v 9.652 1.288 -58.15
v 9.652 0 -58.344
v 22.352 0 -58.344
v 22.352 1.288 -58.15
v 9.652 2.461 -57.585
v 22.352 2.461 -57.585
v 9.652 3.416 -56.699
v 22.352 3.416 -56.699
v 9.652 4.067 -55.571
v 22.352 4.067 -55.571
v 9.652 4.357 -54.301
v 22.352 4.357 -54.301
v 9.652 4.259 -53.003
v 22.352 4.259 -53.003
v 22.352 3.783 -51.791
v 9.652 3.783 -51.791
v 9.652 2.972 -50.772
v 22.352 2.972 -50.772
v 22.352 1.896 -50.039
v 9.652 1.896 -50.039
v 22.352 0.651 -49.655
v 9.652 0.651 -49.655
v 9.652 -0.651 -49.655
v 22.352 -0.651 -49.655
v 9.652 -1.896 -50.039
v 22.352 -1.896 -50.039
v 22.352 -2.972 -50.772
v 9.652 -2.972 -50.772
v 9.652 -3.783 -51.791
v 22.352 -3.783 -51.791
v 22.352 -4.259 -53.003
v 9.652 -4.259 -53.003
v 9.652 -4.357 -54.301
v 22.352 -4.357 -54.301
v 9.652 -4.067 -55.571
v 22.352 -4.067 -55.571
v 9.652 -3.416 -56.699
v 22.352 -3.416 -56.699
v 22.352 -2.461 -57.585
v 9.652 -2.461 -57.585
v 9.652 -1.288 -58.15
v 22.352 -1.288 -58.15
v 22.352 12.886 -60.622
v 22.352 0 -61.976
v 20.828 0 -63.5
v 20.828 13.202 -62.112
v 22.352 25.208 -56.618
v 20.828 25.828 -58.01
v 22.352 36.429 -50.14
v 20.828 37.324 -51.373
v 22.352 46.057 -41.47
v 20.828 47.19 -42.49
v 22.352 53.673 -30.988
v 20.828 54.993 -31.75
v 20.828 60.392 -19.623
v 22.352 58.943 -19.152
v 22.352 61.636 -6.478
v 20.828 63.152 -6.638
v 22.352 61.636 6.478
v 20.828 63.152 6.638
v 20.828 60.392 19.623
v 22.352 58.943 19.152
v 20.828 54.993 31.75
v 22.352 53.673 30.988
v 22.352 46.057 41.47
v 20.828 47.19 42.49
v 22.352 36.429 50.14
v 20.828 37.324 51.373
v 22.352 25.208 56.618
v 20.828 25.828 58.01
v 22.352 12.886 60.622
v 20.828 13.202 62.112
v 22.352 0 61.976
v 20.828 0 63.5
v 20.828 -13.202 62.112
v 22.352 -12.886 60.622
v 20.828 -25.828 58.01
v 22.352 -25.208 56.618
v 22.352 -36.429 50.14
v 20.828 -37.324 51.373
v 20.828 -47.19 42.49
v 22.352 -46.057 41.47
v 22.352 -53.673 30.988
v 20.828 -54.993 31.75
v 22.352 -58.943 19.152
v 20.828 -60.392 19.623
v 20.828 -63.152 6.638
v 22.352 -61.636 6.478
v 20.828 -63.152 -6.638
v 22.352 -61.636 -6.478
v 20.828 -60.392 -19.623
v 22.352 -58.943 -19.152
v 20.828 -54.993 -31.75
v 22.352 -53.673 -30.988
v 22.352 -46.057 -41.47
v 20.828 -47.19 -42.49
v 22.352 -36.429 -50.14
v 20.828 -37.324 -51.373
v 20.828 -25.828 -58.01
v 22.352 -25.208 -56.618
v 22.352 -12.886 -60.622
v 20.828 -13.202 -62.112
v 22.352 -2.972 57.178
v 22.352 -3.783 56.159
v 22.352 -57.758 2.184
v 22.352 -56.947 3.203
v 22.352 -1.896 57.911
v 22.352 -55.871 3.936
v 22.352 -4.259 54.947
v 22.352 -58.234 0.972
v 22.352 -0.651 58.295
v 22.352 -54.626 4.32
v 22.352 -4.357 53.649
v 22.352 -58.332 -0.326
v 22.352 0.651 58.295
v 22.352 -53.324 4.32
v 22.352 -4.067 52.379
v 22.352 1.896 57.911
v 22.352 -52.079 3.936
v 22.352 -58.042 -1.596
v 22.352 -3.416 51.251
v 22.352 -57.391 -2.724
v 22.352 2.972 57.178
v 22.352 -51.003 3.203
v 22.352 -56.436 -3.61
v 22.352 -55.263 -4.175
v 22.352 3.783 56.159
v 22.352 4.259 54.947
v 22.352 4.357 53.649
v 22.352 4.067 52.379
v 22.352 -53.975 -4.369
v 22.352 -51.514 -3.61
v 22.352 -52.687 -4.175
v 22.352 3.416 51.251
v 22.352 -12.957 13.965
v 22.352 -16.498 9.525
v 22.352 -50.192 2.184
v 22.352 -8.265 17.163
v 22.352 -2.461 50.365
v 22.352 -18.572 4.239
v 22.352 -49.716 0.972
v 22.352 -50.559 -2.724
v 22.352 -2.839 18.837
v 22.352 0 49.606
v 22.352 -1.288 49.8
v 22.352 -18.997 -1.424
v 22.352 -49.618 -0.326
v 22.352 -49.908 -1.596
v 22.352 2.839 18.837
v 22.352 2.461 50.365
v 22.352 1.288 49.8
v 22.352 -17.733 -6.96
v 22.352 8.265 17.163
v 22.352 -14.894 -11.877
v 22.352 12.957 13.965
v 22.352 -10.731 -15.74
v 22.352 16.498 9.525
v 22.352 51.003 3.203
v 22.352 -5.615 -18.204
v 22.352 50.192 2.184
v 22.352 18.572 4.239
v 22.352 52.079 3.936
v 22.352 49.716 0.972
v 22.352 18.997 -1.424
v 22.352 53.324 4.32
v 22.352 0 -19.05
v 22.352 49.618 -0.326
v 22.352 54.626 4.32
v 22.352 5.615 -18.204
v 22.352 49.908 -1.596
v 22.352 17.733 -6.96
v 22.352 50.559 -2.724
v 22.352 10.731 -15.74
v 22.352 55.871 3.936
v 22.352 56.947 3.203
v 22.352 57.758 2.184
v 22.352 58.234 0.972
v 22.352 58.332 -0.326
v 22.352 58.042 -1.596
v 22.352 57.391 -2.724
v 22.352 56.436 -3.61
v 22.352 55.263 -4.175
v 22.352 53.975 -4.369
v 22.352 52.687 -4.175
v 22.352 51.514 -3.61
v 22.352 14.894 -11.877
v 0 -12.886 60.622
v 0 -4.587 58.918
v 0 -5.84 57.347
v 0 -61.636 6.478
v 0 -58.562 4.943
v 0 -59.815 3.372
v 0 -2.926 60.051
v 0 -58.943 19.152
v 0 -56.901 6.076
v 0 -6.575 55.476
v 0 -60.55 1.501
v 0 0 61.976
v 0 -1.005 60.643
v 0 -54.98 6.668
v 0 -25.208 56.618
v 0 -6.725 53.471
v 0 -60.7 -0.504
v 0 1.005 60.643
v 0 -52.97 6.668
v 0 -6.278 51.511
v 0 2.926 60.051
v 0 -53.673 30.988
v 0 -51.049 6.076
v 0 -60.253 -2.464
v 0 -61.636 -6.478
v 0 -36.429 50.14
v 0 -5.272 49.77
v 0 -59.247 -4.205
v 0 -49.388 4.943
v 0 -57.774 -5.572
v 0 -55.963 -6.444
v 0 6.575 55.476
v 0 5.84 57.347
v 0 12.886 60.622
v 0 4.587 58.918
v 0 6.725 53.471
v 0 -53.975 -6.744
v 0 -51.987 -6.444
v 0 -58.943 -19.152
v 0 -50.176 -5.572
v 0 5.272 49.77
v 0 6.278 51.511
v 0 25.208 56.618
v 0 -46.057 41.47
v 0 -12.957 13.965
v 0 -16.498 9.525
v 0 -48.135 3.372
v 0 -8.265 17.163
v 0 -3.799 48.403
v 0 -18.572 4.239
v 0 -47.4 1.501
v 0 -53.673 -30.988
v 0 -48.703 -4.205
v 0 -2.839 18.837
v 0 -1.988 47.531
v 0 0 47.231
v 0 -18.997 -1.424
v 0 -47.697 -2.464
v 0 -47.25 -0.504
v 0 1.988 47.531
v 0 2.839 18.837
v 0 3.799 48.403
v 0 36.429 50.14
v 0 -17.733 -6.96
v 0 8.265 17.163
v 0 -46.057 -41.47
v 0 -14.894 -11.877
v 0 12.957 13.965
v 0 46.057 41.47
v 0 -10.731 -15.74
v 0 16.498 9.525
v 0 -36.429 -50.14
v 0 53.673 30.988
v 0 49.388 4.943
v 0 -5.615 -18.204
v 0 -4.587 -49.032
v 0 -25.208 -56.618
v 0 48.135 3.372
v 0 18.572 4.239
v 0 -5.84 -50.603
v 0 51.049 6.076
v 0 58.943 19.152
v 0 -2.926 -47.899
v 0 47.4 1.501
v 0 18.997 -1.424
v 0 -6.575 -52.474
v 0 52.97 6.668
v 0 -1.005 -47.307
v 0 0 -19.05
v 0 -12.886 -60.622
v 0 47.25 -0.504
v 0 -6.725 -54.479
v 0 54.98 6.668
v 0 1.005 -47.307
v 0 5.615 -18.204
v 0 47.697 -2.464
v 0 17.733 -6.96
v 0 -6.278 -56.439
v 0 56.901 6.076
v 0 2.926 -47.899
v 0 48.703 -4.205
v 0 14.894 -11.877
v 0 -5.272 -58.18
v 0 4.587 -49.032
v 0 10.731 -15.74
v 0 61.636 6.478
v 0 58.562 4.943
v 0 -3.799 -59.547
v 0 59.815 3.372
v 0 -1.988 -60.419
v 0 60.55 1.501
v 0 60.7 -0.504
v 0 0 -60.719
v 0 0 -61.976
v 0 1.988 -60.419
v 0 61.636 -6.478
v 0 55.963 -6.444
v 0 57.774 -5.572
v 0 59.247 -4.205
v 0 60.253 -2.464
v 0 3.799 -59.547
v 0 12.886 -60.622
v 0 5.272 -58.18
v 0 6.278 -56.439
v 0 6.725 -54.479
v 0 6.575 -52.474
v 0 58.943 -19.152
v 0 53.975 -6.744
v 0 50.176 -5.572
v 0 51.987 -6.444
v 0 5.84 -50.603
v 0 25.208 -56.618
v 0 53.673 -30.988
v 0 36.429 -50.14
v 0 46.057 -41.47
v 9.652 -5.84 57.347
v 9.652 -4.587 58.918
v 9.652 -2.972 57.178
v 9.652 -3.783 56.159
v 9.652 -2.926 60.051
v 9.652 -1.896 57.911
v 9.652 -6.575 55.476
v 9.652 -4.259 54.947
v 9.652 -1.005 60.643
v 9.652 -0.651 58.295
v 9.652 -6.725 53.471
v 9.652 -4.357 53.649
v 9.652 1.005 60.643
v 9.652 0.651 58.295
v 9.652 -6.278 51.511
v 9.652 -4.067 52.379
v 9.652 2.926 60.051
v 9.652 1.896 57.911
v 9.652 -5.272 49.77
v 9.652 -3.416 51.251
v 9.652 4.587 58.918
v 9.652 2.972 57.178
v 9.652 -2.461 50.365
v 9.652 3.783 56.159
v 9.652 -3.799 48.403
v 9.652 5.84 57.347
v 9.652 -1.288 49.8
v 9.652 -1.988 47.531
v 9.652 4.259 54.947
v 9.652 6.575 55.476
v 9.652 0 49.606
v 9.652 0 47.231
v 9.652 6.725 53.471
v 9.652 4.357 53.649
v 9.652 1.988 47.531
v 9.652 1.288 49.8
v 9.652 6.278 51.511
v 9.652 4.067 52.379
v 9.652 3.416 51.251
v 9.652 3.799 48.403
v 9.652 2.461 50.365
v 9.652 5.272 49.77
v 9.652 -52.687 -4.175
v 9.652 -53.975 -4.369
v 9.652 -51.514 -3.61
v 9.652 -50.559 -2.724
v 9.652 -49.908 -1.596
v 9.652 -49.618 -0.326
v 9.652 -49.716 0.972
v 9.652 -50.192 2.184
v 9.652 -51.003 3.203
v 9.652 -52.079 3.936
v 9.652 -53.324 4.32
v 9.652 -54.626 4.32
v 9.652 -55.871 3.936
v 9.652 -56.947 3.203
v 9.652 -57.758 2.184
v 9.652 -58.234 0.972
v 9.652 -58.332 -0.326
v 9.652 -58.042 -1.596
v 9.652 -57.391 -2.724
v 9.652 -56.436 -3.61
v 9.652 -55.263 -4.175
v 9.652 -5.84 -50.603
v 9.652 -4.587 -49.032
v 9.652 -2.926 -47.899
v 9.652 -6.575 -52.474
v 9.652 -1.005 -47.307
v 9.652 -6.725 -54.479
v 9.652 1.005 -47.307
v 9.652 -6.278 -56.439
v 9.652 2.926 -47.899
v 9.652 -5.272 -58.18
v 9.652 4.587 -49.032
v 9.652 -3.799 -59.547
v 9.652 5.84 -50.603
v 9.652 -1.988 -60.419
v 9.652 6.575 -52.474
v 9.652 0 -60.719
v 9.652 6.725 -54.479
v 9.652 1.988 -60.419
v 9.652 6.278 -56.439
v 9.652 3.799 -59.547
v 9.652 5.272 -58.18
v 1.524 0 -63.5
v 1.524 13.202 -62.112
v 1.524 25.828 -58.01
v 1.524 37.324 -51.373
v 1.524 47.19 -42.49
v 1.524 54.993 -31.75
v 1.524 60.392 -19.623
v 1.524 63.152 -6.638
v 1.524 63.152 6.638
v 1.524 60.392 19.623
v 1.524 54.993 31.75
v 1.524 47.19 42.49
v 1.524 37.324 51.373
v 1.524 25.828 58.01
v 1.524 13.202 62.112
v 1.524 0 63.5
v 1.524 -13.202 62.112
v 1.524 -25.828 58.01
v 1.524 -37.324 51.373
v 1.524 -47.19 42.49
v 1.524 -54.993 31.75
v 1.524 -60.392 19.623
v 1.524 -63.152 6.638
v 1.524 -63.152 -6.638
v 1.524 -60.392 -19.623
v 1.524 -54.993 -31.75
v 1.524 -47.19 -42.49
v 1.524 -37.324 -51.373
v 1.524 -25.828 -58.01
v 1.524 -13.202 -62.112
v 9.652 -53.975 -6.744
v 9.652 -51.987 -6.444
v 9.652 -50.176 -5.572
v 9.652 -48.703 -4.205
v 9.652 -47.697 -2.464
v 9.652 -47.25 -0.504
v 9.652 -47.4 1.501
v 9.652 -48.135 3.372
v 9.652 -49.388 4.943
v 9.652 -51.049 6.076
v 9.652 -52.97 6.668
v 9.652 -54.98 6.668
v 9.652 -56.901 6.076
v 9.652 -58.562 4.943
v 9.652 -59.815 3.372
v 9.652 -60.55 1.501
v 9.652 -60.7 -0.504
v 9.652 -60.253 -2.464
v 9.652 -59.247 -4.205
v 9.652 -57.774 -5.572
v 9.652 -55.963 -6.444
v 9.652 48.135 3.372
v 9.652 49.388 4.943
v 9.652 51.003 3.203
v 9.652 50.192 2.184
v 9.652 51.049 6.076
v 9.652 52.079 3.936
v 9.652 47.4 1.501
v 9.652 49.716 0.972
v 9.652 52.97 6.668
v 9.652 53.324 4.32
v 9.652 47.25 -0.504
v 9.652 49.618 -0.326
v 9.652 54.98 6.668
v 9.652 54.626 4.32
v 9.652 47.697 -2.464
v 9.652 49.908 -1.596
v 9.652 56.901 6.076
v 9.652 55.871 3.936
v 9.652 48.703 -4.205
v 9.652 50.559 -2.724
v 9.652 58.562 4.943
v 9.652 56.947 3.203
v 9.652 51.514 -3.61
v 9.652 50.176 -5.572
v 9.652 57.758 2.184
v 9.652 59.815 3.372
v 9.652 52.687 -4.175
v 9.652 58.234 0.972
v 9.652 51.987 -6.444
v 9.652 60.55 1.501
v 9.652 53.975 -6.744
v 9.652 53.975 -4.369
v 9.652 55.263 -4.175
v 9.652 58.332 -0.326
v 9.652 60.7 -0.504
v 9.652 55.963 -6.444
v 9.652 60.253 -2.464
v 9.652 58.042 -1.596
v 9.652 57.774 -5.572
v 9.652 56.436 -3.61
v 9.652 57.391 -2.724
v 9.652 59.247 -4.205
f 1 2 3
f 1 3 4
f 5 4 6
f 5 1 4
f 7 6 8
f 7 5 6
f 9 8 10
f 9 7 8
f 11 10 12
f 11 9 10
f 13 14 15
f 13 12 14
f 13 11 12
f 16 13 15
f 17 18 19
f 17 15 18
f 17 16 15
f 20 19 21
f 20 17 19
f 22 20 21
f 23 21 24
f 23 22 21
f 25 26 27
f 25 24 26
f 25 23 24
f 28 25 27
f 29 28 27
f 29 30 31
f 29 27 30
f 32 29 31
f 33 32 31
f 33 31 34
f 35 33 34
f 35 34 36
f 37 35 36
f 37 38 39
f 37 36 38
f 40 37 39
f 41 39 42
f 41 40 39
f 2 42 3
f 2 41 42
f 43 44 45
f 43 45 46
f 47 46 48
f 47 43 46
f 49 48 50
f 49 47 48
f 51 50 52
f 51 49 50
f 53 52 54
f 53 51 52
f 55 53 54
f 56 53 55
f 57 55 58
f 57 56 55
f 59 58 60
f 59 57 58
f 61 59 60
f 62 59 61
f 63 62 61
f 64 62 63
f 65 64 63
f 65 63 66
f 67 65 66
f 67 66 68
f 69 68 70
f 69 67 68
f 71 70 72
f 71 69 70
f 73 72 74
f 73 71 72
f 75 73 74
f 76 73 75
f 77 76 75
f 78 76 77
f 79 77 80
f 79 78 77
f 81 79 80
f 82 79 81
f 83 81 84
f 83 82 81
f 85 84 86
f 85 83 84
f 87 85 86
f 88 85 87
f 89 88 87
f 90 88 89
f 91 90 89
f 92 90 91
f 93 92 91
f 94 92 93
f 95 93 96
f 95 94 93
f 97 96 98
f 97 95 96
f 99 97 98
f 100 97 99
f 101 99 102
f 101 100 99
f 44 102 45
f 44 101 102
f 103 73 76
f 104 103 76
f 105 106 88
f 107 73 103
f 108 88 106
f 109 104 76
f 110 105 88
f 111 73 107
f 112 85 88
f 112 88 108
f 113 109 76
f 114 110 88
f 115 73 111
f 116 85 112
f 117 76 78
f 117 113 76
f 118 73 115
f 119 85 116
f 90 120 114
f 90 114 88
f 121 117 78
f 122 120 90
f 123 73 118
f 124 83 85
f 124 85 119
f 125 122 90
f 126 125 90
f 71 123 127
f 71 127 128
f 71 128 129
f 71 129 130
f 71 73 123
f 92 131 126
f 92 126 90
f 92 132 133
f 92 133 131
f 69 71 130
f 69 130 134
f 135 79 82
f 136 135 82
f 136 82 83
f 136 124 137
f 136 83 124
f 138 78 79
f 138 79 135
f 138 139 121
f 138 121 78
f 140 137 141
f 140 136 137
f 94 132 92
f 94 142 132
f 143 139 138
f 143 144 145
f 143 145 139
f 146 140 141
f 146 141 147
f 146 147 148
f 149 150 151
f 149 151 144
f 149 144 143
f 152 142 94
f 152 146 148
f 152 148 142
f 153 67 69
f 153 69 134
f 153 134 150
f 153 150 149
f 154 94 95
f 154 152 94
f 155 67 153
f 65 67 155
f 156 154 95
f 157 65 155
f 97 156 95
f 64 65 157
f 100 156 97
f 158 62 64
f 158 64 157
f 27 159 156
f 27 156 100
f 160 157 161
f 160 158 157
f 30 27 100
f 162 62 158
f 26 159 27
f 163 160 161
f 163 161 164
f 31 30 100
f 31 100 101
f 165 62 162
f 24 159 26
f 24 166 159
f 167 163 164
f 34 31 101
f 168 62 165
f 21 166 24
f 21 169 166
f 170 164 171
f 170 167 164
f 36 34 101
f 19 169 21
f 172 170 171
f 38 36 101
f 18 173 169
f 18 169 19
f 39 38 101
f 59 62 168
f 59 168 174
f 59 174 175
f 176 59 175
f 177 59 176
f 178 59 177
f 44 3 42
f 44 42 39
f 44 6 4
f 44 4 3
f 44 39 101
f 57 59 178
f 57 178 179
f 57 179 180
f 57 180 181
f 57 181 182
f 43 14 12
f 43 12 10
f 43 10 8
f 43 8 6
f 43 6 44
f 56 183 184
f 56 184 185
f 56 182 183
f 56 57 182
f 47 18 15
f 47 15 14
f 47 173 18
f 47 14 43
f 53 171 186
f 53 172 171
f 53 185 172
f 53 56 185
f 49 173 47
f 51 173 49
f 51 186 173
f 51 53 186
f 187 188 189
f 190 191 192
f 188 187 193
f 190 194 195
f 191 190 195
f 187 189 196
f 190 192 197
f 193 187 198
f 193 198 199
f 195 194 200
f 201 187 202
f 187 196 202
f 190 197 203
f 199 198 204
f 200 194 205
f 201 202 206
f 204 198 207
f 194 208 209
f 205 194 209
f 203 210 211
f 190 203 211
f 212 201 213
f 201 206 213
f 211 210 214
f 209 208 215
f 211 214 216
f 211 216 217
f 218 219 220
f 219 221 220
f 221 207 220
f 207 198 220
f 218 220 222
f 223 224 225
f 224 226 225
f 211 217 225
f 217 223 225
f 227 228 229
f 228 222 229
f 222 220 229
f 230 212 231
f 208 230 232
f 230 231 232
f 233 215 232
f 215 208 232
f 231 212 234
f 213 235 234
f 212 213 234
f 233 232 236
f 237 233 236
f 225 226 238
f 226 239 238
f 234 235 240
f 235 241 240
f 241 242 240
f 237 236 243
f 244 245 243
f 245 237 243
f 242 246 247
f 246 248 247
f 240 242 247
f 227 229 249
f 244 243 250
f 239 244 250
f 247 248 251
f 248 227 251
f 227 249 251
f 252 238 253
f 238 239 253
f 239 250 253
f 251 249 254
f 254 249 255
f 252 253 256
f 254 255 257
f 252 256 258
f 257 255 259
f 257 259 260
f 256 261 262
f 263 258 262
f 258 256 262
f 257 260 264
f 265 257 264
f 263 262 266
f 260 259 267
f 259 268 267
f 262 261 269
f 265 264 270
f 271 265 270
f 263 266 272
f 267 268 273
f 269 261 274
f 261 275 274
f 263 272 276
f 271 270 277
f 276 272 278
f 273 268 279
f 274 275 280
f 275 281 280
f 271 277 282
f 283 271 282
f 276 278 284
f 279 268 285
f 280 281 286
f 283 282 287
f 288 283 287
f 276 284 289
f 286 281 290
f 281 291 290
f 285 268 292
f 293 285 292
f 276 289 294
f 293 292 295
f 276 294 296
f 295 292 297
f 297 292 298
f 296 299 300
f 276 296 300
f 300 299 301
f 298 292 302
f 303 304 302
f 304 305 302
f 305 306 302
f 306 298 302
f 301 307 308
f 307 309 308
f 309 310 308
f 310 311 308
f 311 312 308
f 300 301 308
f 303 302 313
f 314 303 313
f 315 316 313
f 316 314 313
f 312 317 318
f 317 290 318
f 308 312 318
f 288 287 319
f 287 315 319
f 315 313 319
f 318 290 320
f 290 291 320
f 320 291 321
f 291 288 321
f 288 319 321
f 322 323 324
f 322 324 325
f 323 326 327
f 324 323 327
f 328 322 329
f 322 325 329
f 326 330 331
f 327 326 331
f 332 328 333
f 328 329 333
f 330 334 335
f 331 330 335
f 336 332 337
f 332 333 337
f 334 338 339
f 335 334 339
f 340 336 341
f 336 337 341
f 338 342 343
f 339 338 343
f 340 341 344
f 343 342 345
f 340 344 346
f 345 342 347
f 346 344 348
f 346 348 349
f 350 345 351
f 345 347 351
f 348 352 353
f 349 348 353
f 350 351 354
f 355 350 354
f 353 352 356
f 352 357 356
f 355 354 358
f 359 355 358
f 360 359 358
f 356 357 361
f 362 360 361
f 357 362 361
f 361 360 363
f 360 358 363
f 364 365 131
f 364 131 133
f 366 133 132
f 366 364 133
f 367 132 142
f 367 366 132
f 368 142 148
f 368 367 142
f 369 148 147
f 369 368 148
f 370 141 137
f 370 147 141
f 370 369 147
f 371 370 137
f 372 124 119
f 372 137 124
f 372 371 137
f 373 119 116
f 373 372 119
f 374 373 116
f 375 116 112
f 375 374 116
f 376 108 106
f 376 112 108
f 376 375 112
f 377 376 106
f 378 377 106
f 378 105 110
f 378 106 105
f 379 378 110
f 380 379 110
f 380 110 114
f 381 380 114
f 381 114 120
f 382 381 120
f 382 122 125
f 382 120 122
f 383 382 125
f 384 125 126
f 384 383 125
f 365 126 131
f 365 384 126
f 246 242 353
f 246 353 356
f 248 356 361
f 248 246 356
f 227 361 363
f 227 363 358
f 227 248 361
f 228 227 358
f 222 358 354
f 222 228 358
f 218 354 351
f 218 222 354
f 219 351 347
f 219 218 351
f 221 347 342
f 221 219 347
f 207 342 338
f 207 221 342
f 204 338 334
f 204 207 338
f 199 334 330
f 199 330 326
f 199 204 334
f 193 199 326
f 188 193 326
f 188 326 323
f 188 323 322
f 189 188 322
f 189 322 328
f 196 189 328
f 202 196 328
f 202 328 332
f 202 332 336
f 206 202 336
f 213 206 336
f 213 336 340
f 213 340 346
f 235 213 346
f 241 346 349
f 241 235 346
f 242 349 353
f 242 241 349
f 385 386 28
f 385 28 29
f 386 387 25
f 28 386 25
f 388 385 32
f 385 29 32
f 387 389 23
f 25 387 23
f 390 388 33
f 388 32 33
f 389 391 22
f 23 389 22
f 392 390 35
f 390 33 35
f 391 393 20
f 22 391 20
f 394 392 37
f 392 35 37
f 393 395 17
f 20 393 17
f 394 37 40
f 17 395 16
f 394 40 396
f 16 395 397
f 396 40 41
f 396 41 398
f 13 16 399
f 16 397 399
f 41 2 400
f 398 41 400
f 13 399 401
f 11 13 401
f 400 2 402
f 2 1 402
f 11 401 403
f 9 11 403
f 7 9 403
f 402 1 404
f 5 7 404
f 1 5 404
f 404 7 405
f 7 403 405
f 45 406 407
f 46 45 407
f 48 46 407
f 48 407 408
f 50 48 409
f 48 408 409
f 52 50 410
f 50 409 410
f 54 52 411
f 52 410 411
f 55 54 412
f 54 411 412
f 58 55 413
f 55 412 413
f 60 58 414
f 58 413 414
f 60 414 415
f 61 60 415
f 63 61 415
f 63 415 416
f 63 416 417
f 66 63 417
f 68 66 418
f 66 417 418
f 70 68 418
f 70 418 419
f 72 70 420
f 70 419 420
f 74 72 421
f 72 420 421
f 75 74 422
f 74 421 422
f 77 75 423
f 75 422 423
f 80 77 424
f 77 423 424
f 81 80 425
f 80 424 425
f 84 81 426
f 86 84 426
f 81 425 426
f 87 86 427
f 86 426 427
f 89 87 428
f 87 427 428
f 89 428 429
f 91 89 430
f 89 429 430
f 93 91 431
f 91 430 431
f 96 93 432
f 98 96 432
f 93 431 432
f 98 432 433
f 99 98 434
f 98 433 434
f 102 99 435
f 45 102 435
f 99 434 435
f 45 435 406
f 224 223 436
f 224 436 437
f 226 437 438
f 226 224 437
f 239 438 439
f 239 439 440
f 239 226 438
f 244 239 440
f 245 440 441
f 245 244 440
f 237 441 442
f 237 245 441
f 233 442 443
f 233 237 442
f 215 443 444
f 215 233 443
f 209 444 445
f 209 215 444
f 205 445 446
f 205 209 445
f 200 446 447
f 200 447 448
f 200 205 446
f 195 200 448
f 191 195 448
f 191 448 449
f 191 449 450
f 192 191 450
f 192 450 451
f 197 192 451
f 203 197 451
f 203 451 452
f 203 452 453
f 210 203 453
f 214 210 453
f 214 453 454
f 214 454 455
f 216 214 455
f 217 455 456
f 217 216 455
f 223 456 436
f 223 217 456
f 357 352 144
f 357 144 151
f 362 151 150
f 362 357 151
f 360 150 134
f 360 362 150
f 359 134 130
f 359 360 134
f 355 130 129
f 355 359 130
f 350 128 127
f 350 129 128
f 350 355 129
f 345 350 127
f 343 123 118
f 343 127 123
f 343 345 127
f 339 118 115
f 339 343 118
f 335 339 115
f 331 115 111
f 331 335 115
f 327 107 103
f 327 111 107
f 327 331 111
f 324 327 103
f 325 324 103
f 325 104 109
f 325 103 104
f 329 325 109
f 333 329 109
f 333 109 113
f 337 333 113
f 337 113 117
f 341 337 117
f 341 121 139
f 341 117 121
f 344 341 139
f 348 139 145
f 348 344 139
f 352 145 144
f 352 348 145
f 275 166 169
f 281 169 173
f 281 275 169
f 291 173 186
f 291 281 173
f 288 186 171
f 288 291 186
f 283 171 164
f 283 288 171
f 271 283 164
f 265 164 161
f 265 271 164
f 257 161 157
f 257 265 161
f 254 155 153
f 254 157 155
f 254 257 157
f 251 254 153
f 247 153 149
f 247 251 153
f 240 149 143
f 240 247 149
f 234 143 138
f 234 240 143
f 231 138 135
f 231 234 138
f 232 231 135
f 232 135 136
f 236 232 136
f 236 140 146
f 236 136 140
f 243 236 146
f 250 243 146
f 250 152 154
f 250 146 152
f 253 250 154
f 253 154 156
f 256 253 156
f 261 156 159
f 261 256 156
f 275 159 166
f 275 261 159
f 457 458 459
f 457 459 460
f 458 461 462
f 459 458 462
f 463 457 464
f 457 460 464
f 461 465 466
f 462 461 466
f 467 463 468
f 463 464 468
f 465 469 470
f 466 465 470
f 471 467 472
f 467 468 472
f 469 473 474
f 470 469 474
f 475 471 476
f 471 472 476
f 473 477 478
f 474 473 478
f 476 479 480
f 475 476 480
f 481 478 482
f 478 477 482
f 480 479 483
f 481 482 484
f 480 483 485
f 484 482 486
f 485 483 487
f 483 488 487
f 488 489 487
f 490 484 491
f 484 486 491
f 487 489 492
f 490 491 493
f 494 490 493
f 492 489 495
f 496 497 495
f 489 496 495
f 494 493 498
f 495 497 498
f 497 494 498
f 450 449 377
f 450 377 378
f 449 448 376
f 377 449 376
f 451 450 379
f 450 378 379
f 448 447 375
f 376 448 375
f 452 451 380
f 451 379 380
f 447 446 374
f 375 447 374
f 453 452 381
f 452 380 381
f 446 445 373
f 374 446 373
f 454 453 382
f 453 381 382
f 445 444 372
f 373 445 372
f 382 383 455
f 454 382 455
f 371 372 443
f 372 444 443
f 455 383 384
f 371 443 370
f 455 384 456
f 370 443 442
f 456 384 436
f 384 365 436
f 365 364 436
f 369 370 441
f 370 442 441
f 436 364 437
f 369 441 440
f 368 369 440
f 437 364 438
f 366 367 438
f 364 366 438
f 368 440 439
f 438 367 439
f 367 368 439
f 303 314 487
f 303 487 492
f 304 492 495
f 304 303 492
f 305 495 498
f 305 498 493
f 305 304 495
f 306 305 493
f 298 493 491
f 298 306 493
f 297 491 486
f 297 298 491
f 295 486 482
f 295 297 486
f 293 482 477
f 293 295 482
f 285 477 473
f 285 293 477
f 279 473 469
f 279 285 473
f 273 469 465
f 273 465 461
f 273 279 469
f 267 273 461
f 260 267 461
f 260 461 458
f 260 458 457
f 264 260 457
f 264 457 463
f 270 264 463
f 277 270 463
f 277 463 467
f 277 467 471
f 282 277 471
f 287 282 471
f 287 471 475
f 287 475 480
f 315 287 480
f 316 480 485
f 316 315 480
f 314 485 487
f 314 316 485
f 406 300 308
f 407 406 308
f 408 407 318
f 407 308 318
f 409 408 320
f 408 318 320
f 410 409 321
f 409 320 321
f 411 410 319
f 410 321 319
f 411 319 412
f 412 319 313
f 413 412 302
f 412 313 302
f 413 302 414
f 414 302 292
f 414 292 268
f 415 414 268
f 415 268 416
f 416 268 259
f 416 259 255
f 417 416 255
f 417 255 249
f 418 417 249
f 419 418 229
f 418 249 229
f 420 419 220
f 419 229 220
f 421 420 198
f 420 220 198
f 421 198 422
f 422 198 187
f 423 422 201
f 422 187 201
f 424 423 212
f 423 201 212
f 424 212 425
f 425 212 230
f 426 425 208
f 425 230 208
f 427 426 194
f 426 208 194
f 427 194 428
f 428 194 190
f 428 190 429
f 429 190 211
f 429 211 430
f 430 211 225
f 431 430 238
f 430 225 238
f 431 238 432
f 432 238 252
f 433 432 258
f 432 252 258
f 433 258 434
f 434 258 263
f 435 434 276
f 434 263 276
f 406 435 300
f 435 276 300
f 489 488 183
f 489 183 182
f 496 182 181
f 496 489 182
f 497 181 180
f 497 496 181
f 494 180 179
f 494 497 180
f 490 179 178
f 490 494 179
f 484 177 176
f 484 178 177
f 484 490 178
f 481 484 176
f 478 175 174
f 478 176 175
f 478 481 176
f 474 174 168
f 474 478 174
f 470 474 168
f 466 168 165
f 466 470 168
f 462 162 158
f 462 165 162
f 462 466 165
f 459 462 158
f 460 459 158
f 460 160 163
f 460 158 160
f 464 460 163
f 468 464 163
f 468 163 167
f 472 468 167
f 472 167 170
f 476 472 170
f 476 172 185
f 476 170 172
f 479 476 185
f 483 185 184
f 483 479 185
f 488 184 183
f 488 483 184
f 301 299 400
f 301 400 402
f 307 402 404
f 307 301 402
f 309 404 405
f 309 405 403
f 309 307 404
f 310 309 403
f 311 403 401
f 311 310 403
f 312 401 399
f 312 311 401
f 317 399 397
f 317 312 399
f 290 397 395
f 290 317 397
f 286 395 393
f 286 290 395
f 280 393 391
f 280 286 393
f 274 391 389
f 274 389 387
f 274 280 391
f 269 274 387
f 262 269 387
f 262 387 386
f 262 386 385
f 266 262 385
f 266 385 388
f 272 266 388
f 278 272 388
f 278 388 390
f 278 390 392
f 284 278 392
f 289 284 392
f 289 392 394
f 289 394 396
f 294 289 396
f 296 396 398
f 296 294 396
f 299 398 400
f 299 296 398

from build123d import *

# Parameters (mm, degrees)
SKETCH1_R           = 63.5
BOSS_EXTRUDE1_DEPTH = 22.352
SKETCH2_R           = 19.05
CUT_EXTRUDE2_DEPTH  = 93.542487021
SKETCH3_R           = 4.3688
CUT_EXTRUDE4_DEPTH  = 93.542487021
SKETCH4_R           = 6.7437
CUT_EXTRUDE5_DEPTH  = 9.652
CHAMFER1_SIZE       = 1.524


with BuildPart() as part:
    # Sketch1 → Boss-Extrude1 (new body)
    with BuildSketch(Plane.YZ):
        with Locations(Location((0, 0, 0), (0, 0, 270))):
            Circle(SKETCH1_R)
    extrude(amount=BOSS_EXTRUDE1_DEPTH)

    # Sketch2 → Cut-Extrude2 (cut, through all)
    with BuildSketch(Plane.YZ):
        with Locations(Location((0, 0, 0), (0, 0, 270))):
            Circle(SKETCH2_R)
    extrude(amount=CUT_EXTRUDE2_DEPTH, mode=Mode.SUBTRACT)

    # Sketch3 → Cut-Extrude4 (cut, through all)
    with BuildSketch(Plane.YZ):
        with Locations(Location((53.975, 0, 0), (0, 0, 270))):
            Circle(SKETCH3_R)
        with Locations(Location((0, 53.975, 0), (0, 0, 270))):
            Circle(SKETCH3_R)
        with Locations(Location((-53.975, 0, 0), (0, 0, 270))):
            Circle(SKETCH3_R)
        with Locations(Location((0, -53.975, 0), (0, 0, 270))):
            Circle(SKETCH3_R)
    extrude(amount=CUT_EXTRUDE4_DEPTH, mode=Mode.SUBTRACT)

    # Sketch4 → Cut-Extrude5 (cut)
    with BuildSketch(Plane.YZ):
        with Locations(Location((53.975, 0, 0), (0, 0, 270))):
            Circle(SKETCH4_R)
        with Locations(Location((0, 53.975, 0), (0, 0, 270))):
            Circle(SKETCH4_R)
        with Locations(Location((-53.975, 0, 0), (0, 0, 270))):
            Circle(SKETCH4_R)
        with Locations(Location((0, -53.975, 0), (0, 0, 270))):
            Circle(SKETCH4_R)
    extrude(amount=CUT_EXTRUDE5_DEPTH, mode=Mode.SUBTRACT)

    # Chamfer1
    chamfer1_edges = [part.edges().sort_by_distance(p)[0] for p in [
        (0, 0, 63.5),
        (22.352, 0, 63.5),
    ]]
    chamfer(chamfer1_edges, length=CHAMFER1_SIZE)


solid = part.part
